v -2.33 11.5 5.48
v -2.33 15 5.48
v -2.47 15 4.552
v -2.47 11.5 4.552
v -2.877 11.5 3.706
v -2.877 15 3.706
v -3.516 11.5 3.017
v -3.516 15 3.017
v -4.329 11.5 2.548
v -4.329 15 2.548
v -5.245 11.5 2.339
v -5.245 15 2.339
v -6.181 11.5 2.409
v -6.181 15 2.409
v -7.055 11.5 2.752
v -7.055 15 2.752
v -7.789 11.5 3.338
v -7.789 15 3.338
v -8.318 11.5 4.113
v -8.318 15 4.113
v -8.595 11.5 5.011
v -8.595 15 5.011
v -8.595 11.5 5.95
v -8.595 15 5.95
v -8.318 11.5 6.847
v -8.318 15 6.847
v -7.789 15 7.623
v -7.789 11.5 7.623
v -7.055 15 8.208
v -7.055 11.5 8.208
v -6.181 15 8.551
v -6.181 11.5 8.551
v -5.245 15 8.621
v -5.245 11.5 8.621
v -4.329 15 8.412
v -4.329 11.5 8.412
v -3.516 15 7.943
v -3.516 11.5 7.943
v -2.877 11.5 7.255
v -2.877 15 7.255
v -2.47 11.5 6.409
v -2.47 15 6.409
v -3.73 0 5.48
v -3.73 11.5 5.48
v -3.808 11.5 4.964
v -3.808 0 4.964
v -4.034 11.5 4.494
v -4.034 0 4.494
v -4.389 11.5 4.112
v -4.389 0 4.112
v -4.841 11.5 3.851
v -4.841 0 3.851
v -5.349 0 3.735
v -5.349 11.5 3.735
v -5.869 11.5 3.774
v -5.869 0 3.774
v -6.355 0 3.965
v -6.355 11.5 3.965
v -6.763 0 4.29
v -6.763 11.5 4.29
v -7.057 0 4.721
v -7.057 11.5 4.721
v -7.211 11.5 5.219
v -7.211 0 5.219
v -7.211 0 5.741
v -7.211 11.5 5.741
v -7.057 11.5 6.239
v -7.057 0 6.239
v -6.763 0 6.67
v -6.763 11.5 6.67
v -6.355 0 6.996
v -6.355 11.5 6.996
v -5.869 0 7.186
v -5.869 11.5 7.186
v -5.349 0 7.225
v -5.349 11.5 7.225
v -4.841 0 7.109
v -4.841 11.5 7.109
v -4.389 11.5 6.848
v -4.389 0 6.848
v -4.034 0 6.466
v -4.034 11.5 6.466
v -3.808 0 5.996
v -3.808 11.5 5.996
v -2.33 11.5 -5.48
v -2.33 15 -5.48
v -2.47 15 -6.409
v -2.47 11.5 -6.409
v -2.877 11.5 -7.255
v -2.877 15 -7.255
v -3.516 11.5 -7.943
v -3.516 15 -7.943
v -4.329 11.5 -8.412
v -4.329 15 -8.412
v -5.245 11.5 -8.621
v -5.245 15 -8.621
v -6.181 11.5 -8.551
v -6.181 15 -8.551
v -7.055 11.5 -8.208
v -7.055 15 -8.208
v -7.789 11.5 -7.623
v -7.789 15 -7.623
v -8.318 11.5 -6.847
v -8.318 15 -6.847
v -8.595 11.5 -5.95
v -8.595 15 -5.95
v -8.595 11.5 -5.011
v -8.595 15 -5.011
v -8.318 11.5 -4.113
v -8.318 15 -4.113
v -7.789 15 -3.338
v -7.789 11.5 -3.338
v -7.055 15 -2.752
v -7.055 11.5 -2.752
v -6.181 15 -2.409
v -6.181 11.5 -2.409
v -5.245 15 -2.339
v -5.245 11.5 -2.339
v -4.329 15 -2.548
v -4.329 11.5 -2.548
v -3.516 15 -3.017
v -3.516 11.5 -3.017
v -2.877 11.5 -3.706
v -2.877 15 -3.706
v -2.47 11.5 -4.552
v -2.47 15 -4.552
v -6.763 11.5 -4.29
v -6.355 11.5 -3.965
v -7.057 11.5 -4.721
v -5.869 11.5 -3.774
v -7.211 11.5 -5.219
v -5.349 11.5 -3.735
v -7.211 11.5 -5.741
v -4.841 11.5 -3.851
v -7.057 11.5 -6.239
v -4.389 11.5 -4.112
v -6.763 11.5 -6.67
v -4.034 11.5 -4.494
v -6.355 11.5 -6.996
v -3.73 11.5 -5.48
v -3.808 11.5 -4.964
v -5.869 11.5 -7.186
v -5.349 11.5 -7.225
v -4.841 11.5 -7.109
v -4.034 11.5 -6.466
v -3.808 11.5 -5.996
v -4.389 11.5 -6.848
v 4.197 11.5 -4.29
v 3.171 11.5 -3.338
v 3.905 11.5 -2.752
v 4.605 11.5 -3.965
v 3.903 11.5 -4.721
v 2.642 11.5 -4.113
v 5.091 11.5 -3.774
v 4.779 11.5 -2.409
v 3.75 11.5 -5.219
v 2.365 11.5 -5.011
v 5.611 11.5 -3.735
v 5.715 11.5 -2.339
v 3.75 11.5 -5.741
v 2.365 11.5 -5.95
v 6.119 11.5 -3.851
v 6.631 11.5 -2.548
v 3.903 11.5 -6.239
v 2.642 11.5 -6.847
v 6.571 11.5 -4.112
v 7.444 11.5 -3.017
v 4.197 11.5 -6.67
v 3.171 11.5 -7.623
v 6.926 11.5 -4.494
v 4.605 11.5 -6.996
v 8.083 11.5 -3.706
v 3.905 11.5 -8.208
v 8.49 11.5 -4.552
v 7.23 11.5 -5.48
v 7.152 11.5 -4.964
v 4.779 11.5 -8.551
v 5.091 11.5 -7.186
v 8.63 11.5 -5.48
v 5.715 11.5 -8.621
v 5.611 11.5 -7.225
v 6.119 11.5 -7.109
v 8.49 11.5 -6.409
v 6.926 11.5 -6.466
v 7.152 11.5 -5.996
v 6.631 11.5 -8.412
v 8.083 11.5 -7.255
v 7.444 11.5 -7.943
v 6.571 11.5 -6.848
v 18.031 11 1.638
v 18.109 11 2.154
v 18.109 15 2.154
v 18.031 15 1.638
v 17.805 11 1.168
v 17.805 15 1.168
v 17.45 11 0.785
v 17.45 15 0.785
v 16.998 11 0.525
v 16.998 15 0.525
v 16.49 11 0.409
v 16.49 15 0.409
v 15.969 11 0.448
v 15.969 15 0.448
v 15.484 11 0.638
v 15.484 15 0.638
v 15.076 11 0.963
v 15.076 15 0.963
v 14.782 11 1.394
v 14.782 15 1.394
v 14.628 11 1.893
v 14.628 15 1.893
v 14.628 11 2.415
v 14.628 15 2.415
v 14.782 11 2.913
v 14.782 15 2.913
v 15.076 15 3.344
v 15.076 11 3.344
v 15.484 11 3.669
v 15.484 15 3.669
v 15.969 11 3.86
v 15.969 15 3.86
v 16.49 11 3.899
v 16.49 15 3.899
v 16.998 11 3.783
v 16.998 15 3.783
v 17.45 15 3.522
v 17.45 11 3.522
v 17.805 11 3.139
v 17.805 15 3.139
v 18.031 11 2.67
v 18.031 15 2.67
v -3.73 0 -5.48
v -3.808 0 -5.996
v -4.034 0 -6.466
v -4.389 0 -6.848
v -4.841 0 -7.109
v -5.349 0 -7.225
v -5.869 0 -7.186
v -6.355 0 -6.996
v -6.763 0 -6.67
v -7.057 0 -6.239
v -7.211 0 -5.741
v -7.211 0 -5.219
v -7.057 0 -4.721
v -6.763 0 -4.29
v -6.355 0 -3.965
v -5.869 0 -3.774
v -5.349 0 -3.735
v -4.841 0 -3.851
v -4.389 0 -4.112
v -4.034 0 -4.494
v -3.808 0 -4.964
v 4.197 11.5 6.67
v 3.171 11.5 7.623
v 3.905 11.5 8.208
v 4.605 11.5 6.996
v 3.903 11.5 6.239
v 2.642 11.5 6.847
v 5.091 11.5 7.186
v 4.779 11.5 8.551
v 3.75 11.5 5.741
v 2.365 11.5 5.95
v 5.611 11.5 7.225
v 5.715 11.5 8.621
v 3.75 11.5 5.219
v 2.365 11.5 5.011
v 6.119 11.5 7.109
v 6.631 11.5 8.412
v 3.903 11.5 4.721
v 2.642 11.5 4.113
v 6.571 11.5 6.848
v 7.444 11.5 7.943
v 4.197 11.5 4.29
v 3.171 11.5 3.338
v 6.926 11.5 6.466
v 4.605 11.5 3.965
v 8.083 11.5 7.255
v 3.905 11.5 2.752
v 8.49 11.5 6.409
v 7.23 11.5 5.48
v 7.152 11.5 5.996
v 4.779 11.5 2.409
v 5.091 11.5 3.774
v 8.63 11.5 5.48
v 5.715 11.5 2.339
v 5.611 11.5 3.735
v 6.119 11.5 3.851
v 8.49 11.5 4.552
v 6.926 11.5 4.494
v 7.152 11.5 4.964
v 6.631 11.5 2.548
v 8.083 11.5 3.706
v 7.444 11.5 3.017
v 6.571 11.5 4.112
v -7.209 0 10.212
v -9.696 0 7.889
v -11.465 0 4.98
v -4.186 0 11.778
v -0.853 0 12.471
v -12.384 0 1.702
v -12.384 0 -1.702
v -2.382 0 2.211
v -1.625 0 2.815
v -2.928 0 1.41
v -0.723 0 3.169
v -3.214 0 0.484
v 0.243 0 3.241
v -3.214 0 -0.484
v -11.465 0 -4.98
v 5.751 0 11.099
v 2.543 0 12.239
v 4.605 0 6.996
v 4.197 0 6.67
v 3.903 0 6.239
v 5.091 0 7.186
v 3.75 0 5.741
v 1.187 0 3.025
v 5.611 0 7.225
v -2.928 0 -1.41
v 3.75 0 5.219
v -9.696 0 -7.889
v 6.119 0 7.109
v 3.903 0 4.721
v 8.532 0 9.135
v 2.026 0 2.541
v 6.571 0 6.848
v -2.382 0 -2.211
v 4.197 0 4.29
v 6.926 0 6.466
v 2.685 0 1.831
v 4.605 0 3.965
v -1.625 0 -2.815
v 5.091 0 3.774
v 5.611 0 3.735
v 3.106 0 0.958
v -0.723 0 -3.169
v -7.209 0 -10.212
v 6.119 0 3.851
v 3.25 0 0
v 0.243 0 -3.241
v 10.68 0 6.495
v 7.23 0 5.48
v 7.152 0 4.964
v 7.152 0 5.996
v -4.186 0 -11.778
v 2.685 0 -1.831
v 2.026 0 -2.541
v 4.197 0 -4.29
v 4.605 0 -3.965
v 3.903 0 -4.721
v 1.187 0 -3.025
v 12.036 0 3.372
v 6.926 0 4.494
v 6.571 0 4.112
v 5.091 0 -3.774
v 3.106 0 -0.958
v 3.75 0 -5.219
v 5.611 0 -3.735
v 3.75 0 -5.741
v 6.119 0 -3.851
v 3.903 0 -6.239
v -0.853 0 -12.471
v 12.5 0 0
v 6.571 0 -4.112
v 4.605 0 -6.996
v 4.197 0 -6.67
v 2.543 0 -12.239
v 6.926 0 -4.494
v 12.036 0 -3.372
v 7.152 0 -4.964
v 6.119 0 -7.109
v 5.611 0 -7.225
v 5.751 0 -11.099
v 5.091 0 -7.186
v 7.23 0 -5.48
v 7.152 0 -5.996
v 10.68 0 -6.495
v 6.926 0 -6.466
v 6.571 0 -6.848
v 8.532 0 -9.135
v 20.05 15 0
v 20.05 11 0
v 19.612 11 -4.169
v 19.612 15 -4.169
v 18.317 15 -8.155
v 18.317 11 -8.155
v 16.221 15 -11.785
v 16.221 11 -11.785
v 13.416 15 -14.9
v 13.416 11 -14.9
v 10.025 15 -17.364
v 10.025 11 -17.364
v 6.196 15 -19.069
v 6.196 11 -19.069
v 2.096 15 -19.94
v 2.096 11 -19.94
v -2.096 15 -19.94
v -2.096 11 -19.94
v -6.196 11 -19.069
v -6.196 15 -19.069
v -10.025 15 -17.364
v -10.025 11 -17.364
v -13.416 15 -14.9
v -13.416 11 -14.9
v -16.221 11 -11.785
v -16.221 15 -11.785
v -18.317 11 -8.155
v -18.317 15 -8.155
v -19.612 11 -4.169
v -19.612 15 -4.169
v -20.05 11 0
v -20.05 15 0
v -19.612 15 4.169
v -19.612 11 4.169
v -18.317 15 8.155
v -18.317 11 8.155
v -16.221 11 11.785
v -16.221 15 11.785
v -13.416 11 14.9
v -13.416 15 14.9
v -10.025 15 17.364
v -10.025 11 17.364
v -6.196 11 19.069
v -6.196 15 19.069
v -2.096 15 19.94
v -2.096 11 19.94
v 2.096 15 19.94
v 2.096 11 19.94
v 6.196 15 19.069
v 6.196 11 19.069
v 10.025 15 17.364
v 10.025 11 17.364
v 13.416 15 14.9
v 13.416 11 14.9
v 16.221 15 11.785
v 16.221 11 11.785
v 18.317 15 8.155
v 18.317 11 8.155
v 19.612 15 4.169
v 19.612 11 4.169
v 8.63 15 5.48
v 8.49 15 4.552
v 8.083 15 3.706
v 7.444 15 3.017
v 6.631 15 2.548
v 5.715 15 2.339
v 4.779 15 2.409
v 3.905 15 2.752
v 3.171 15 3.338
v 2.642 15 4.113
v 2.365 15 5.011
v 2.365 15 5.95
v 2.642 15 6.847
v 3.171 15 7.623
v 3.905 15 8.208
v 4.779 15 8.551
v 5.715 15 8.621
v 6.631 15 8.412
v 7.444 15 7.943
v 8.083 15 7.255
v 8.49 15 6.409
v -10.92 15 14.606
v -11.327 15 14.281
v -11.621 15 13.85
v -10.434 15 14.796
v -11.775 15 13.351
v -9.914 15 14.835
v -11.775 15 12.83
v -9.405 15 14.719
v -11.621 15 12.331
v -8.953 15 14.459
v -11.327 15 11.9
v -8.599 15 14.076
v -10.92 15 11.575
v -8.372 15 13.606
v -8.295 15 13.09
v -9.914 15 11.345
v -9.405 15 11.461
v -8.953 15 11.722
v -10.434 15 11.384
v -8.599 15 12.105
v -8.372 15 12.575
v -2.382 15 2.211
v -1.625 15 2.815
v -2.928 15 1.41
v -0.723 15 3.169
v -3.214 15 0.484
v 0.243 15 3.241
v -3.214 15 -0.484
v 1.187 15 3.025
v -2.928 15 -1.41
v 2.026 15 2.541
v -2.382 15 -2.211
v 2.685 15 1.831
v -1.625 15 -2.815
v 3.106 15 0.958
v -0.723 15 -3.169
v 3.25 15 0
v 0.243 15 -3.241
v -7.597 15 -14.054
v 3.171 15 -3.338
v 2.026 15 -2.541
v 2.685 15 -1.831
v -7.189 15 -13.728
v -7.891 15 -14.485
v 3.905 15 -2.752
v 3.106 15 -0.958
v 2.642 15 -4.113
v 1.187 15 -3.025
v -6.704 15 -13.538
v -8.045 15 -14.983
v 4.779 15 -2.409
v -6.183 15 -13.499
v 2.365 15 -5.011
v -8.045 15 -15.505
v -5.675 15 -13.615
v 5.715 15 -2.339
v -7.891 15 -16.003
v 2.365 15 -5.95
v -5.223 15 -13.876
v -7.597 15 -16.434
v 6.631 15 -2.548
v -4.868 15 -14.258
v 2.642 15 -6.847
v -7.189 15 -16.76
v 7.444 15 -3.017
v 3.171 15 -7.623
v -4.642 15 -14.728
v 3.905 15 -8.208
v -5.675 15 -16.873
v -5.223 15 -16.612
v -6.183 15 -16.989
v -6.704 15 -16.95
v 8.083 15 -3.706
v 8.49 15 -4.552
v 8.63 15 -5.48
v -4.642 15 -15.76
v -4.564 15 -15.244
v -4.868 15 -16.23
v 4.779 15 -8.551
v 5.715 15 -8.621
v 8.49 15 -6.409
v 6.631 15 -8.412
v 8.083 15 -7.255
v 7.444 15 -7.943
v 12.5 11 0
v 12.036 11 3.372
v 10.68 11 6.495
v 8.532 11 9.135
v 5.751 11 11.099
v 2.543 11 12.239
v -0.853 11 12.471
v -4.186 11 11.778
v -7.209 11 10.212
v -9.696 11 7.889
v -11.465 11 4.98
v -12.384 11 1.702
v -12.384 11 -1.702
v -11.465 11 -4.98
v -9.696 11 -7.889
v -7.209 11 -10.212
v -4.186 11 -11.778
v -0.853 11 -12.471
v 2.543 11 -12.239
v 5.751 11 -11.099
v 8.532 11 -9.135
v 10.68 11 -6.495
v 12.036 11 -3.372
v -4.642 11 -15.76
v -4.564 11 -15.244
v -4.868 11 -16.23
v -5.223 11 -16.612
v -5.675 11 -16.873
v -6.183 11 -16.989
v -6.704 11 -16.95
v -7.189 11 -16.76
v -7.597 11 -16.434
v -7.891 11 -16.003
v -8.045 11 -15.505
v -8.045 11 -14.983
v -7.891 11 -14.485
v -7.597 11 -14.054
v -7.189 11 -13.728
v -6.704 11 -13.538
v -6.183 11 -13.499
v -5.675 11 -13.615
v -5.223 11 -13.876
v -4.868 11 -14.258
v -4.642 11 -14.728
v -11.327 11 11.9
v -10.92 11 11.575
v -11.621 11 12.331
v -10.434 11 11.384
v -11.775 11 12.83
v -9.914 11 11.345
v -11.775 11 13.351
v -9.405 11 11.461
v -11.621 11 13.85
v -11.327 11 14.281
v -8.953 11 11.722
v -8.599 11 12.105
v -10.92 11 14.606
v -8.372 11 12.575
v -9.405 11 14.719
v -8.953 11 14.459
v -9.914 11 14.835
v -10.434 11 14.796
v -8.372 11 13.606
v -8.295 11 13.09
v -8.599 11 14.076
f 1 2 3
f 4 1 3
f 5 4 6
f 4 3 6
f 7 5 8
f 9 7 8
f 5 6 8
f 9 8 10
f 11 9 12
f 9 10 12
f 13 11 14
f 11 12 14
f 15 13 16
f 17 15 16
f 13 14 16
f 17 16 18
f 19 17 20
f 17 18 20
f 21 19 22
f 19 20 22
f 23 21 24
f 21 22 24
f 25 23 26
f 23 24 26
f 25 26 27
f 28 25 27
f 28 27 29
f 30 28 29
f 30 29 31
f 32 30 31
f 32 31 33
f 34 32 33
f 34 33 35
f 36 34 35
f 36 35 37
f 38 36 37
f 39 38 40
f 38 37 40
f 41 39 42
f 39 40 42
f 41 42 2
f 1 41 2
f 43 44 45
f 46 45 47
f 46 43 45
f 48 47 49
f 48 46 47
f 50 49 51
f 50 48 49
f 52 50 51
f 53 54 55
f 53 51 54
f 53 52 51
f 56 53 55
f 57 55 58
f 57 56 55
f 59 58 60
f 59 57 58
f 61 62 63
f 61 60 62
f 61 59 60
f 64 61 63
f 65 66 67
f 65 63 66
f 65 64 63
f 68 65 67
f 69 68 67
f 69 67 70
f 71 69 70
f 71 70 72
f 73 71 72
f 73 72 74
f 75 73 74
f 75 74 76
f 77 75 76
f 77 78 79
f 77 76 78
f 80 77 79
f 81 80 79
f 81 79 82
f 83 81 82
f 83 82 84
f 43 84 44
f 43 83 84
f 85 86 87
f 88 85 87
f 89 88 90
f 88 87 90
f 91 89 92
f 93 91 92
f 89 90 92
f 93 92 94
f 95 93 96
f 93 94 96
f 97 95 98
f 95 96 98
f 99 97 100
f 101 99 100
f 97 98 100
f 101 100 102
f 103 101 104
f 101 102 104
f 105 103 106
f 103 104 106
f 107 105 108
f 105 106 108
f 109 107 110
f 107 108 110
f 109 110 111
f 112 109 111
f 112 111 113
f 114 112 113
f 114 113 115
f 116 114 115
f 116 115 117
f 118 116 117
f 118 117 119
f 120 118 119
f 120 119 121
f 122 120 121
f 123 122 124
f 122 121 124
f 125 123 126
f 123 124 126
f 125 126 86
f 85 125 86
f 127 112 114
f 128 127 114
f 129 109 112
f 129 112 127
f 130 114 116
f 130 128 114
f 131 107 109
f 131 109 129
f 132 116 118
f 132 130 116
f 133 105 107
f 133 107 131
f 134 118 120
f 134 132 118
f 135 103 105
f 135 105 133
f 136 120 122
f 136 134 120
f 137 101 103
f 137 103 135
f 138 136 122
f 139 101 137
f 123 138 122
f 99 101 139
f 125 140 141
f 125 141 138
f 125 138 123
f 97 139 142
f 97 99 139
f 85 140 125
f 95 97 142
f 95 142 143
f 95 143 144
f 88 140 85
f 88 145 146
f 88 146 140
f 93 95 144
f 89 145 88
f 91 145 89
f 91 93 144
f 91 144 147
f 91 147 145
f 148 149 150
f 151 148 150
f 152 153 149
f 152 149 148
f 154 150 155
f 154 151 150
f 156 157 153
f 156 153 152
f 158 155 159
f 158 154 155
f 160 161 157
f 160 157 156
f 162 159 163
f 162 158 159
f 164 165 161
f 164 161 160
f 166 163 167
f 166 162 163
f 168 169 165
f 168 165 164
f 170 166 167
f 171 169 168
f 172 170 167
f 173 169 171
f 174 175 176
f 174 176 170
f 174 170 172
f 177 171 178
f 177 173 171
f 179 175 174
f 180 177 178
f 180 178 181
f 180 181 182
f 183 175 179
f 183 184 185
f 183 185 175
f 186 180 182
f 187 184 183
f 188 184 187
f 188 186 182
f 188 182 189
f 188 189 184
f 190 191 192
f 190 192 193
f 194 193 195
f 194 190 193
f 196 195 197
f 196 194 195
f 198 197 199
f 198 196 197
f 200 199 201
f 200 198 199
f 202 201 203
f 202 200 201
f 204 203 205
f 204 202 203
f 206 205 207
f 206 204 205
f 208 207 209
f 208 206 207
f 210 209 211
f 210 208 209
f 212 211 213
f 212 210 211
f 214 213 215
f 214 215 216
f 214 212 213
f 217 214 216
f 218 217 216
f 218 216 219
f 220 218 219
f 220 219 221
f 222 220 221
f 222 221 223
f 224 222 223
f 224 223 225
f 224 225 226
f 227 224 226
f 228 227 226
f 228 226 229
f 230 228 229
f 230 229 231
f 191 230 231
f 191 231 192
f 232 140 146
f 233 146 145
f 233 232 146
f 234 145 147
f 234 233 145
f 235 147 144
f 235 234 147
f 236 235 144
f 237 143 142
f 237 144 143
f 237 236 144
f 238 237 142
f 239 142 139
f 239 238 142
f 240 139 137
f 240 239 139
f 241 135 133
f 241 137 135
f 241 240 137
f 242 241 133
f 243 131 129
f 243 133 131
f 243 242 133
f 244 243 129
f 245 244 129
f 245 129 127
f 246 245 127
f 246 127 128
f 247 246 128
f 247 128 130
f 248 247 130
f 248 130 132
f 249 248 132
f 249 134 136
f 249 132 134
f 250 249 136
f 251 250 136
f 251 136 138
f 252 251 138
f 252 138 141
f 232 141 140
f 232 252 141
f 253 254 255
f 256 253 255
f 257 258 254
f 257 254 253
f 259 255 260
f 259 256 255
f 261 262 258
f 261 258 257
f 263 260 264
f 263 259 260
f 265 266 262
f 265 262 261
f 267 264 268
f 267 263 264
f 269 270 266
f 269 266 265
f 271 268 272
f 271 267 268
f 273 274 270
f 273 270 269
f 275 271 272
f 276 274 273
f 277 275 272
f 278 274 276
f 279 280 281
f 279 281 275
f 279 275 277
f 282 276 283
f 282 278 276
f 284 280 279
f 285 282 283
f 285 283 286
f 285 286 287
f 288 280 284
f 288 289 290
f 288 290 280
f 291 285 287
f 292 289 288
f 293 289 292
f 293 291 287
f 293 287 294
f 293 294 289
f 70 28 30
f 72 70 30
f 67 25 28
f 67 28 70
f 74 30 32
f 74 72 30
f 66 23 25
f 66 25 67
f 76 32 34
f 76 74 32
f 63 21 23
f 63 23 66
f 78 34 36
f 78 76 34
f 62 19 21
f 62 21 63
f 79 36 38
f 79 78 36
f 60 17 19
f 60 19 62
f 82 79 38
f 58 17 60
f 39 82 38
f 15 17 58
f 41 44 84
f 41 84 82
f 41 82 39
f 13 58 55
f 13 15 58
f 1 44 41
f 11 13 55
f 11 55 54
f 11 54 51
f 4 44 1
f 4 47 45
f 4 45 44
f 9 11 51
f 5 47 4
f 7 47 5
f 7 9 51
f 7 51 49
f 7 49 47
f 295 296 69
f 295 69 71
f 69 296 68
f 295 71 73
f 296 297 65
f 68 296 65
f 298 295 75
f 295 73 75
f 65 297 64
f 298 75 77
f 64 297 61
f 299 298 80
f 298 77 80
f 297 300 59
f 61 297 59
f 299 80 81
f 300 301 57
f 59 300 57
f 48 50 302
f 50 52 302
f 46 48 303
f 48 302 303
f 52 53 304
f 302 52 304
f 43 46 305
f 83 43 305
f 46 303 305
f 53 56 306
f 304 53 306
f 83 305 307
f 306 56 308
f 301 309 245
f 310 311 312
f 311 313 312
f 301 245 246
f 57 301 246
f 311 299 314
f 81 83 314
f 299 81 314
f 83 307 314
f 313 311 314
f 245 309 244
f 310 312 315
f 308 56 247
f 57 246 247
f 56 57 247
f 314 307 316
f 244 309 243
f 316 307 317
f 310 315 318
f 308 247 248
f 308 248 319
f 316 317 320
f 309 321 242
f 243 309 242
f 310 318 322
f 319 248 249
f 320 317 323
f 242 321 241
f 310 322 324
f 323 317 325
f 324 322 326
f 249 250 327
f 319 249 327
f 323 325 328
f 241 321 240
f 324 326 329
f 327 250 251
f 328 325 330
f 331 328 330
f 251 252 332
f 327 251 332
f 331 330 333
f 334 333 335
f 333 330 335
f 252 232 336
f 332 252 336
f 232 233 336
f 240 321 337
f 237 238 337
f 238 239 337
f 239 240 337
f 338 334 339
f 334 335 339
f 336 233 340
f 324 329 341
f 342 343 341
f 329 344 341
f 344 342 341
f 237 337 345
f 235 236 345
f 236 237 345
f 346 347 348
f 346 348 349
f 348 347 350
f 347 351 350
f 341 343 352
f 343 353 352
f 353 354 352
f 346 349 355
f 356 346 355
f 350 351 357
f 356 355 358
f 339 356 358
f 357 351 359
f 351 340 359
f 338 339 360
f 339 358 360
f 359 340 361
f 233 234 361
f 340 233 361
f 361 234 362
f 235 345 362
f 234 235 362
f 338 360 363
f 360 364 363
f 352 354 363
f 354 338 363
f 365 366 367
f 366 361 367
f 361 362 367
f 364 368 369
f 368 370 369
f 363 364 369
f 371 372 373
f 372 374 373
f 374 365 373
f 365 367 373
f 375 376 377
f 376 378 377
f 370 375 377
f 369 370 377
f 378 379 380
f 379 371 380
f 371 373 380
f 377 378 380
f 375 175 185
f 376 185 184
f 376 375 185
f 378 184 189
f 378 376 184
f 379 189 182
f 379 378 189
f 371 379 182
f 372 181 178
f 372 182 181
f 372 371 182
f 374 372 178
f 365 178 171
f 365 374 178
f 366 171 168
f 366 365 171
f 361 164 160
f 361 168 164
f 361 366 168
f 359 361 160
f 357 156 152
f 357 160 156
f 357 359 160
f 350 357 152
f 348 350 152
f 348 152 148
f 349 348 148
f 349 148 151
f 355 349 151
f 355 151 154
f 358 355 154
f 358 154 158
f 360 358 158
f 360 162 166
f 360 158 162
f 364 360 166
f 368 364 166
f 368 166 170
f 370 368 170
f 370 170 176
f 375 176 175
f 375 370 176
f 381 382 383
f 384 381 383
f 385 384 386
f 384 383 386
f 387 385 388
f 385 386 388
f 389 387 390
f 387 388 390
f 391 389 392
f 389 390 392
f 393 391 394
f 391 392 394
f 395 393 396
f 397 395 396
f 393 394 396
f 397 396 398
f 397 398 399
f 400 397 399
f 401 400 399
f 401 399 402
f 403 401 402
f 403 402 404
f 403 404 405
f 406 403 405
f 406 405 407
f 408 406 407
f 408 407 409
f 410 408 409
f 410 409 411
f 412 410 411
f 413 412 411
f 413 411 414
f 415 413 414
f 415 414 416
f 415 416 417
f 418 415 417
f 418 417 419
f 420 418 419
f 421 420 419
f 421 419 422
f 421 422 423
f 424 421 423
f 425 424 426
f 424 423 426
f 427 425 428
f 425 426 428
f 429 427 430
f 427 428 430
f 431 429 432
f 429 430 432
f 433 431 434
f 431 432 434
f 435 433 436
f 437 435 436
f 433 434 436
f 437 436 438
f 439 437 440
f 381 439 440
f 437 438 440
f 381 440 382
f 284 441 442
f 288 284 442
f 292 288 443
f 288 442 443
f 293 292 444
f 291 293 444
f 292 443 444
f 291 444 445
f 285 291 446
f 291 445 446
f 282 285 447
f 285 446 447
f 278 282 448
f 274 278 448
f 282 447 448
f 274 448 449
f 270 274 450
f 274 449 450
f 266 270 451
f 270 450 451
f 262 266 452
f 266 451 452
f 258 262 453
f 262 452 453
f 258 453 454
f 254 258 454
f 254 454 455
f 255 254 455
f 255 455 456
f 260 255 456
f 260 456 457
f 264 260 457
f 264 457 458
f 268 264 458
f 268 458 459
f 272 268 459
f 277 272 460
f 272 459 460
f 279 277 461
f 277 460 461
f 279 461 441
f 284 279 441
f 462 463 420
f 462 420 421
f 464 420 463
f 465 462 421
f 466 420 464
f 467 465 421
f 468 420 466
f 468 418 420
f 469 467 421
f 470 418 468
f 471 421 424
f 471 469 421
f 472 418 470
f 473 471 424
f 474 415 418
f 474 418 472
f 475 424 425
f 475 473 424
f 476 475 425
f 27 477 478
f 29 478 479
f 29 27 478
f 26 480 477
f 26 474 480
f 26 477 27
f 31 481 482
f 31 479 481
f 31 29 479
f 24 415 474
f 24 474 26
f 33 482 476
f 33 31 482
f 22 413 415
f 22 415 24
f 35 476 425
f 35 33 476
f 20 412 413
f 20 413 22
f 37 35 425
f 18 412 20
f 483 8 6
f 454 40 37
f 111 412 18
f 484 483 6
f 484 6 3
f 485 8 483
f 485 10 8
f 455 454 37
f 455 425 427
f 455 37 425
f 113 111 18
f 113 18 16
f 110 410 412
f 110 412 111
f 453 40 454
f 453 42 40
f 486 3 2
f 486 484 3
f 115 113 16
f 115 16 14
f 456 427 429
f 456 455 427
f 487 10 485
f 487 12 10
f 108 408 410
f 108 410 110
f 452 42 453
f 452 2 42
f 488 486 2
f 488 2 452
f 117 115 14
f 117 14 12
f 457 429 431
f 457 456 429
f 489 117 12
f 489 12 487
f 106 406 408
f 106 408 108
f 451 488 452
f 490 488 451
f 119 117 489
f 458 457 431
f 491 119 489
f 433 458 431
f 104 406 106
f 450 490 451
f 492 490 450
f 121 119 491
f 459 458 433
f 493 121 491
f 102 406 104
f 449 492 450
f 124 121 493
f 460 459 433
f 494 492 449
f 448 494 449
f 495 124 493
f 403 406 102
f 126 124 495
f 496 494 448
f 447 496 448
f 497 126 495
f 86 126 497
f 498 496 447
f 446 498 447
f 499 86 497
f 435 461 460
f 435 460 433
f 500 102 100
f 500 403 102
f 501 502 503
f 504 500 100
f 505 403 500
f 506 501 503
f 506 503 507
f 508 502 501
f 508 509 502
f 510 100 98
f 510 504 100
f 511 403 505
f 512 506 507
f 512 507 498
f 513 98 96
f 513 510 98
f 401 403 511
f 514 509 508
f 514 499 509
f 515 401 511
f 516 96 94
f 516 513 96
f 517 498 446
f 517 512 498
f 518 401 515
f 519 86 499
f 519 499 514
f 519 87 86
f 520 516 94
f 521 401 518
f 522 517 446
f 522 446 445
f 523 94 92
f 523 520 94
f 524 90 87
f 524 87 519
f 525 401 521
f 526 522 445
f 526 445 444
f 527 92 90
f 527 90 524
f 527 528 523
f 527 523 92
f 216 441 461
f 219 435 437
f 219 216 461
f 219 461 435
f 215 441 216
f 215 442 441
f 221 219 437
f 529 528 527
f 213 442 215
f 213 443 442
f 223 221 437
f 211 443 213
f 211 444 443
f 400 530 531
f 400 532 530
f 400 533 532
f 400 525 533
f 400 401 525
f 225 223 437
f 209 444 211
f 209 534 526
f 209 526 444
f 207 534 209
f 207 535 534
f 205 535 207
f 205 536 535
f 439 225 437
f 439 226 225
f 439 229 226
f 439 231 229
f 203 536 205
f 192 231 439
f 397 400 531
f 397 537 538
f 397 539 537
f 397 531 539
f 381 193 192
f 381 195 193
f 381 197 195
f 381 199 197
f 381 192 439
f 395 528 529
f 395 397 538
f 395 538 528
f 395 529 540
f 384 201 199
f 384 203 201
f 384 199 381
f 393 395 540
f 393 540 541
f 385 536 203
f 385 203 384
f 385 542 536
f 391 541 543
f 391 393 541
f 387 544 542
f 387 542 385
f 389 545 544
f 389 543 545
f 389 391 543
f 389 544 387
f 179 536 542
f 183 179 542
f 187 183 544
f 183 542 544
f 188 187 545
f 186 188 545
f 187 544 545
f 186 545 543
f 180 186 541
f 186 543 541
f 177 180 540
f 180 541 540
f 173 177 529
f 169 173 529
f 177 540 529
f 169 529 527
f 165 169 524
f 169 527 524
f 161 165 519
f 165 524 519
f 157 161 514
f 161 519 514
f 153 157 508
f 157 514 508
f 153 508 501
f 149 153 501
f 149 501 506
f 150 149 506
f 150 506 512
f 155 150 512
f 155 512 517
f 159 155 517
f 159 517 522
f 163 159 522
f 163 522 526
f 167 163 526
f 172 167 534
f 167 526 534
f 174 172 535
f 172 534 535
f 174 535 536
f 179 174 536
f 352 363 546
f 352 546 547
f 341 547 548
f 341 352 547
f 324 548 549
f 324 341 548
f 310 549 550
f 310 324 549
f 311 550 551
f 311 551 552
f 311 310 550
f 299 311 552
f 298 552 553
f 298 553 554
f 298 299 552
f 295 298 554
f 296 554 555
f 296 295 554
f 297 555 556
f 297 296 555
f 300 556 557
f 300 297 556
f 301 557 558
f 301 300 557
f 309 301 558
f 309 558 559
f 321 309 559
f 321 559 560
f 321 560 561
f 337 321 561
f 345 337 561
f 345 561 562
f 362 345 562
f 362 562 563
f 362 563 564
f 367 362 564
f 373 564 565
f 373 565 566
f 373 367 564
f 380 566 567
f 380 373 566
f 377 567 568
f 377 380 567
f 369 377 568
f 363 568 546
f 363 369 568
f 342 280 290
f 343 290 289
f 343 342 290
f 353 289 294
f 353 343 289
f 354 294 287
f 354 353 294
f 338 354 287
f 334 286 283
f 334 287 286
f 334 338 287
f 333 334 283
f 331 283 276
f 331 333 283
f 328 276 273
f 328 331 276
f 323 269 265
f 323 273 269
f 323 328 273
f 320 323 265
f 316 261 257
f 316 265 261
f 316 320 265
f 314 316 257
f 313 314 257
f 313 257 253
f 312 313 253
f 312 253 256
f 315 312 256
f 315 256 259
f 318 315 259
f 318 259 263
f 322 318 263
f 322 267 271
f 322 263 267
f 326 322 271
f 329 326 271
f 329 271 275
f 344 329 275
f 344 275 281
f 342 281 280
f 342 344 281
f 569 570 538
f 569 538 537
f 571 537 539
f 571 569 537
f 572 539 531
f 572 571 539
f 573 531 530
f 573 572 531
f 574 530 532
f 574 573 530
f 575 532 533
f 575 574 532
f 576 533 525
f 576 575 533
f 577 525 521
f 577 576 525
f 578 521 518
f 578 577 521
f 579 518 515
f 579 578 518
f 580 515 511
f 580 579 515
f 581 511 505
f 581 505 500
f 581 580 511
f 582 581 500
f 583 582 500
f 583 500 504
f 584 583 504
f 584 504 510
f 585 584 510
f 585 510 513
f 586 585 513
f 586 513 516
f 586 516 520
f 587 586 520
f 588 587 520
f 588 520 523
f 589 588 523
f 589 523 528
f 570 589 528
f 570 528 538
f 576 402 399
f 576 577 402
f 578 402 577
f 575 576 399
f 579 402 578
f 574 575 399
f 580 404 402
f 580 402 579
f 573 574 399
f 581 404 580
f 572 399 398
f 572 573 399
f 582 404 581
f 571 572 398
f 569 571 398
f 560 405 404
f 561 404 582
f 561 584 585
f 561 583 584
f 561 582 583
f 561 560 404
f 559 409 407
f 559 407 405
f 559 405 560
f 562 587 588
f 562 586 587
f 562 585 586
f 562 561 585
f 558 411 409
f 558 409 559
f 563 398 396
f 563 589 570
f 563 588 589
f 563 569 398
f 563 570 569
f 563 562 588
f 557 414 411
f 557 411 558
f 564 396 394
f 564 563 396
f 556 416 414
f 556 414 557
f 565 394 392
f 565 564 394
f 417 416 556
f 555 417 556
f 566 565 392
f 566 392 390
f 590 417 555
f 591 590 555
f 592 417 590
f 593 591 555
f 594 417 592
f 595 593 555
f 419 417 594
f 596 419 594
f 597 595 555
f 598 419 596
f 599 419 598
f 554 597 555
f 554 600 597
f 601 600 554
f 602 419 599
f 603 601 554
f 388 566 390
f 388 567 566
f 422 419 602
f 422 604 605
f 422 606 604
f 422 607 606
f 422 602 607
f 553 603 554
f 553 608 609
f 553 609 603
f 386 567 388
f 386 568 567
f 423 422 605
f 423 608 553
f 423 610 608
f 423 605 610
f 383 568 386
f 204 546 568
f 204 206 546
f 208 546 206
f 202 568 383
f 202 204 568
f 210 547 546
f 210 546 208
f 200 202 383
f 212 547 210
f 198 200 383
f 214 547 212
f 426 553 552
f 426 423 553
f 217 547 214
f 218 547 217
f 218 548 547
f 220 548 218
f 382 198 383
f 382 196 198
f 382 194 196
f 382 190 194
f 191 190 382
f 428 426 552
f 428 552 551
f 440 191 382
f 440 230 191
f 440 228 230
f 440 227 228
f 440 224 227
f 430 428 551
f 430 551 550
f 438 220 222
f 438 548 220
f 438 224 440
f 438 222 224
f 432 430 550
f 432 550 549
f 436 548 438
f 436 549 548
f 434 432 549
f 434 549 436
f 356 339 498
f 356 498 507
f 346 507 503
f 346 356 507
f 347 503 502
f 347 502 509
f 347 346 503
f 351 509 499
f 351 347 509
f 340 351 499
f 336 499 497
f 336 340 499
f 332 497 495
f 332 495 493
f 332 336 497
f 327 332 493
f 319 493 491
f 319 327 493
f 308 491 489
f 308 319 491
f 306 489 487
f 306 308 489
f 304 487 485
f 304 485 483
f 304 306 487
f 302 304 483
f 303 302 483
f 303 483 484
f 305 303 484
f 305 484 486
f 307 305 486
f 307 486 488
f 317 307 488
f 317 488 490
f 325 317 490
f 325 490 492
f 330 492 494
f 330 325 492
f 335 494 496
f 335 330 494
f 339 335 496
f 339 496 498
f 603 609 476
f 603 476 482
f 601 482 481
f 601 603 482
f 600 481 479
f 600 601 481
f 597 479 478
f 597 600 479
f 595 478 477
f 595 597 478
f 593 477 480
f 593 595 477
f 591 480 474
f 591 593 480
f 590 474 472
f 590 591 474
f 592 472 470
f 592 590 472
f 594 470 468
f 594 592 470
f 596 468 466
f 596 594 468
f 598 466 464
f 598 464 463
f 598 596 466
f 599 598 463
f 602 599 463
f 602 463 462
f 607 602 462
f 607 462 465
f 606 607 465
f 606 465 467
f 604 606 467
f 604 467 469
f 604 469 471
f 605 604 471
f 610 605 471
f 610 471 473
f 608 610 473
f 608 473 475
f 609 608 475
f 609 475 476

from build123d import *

# Parameters (mm, degrees)
SKETCH1_R      = 20.05
SKETCH1_R_2    = 3.25
SKETCH1_R_3    = 1.75
EXTRUDE1_DEPTH = 15
SKETCH7_R      = 3.15
EXTRUDE4_DEPTH = 3.5
SKETCH8_R      = 20.05
SKETCH8_R_2    = 12.5
EXTRUDE5_DEPTH = 11


with BuildPart() as part:
    # Sketch1 → Extrude1 (new body)
    with BuildSketch(Plane(origin=(0, 0, 0), x_dir=(1, 0, 0), z_dir=(0, 1, 0))):
        Circle(SKETCH1_R)
        Circle(SKETCH1_R_2, mode=Mode.SUBTRACT)
        with Locations((5.480077554, 5.480077554)):
            Circle(SKETCH1_R_3, mode=Mode.SUBTRACT)
        with Locations((5.480077554, -5.480077554)):
            Circle(SKETCH1_R_3, mode=Mode.SUBTRACT)
        with Locations((-5.480077554, -5.480077554)):
            Circle(SKETCH1_R_3, mode=Mode.SUBTRACT)
        with Locations((-5.480077554, 5.480077554)):
            Circle(SKETCH1_R_3, mode=Mode.SUBTRACT)
        with Locations((-10.044563579, -13.090330115)):
            Circle(SKETCH1_R_3, mode=Mode.SUBTRACT)
        with Locations((-6.314276634, 15.244012286)):
            Circle(SKETCH1_R_3, mode=Mode.SUBTRACT)
        with Locations((16.358840213, -2.153682172)):
            Circle(SKETCH1_R_3, mode=Mode.SUBTRACT)
    extrude(amount=EXTRUDE1_DEPTH)

    # Sketch7 → Extrude4 (cut)
    with BuildSketch(Plane(origin=(0, 15, 0), x_dir=(1, 0, 0), z_dir=(0, 1, 0))):
        with Locations((-5.480077554, 5.480077554)):
            Circle(SKETCH7_R)
        with Locations((5.480077554, 5.480077554)):
            Circle(SKETCH7_R)
        with Locations((5.480077554, -5.480077554)):
            Circle(SKETCH7_R)
        with Locations((-5.480077554, -5.480077554)):
            Circle(SKETCH7_R)
    extrude(amount=-EXTRUDE4_DEPTH, mode=Mode.SUBTRACT)

    # Sketch8 → Extrude5 (cut)
    with BuildSketch(Plane.XZ):
        Circle(SKETCH8_R)
        Circle(SKETCH8_R_2, mode=Mode.SUBTRACT)
    extrude(amount=-EXTRUDE5_DEPTH, mode=Mode.SUBTRACT)


solid = part.part
